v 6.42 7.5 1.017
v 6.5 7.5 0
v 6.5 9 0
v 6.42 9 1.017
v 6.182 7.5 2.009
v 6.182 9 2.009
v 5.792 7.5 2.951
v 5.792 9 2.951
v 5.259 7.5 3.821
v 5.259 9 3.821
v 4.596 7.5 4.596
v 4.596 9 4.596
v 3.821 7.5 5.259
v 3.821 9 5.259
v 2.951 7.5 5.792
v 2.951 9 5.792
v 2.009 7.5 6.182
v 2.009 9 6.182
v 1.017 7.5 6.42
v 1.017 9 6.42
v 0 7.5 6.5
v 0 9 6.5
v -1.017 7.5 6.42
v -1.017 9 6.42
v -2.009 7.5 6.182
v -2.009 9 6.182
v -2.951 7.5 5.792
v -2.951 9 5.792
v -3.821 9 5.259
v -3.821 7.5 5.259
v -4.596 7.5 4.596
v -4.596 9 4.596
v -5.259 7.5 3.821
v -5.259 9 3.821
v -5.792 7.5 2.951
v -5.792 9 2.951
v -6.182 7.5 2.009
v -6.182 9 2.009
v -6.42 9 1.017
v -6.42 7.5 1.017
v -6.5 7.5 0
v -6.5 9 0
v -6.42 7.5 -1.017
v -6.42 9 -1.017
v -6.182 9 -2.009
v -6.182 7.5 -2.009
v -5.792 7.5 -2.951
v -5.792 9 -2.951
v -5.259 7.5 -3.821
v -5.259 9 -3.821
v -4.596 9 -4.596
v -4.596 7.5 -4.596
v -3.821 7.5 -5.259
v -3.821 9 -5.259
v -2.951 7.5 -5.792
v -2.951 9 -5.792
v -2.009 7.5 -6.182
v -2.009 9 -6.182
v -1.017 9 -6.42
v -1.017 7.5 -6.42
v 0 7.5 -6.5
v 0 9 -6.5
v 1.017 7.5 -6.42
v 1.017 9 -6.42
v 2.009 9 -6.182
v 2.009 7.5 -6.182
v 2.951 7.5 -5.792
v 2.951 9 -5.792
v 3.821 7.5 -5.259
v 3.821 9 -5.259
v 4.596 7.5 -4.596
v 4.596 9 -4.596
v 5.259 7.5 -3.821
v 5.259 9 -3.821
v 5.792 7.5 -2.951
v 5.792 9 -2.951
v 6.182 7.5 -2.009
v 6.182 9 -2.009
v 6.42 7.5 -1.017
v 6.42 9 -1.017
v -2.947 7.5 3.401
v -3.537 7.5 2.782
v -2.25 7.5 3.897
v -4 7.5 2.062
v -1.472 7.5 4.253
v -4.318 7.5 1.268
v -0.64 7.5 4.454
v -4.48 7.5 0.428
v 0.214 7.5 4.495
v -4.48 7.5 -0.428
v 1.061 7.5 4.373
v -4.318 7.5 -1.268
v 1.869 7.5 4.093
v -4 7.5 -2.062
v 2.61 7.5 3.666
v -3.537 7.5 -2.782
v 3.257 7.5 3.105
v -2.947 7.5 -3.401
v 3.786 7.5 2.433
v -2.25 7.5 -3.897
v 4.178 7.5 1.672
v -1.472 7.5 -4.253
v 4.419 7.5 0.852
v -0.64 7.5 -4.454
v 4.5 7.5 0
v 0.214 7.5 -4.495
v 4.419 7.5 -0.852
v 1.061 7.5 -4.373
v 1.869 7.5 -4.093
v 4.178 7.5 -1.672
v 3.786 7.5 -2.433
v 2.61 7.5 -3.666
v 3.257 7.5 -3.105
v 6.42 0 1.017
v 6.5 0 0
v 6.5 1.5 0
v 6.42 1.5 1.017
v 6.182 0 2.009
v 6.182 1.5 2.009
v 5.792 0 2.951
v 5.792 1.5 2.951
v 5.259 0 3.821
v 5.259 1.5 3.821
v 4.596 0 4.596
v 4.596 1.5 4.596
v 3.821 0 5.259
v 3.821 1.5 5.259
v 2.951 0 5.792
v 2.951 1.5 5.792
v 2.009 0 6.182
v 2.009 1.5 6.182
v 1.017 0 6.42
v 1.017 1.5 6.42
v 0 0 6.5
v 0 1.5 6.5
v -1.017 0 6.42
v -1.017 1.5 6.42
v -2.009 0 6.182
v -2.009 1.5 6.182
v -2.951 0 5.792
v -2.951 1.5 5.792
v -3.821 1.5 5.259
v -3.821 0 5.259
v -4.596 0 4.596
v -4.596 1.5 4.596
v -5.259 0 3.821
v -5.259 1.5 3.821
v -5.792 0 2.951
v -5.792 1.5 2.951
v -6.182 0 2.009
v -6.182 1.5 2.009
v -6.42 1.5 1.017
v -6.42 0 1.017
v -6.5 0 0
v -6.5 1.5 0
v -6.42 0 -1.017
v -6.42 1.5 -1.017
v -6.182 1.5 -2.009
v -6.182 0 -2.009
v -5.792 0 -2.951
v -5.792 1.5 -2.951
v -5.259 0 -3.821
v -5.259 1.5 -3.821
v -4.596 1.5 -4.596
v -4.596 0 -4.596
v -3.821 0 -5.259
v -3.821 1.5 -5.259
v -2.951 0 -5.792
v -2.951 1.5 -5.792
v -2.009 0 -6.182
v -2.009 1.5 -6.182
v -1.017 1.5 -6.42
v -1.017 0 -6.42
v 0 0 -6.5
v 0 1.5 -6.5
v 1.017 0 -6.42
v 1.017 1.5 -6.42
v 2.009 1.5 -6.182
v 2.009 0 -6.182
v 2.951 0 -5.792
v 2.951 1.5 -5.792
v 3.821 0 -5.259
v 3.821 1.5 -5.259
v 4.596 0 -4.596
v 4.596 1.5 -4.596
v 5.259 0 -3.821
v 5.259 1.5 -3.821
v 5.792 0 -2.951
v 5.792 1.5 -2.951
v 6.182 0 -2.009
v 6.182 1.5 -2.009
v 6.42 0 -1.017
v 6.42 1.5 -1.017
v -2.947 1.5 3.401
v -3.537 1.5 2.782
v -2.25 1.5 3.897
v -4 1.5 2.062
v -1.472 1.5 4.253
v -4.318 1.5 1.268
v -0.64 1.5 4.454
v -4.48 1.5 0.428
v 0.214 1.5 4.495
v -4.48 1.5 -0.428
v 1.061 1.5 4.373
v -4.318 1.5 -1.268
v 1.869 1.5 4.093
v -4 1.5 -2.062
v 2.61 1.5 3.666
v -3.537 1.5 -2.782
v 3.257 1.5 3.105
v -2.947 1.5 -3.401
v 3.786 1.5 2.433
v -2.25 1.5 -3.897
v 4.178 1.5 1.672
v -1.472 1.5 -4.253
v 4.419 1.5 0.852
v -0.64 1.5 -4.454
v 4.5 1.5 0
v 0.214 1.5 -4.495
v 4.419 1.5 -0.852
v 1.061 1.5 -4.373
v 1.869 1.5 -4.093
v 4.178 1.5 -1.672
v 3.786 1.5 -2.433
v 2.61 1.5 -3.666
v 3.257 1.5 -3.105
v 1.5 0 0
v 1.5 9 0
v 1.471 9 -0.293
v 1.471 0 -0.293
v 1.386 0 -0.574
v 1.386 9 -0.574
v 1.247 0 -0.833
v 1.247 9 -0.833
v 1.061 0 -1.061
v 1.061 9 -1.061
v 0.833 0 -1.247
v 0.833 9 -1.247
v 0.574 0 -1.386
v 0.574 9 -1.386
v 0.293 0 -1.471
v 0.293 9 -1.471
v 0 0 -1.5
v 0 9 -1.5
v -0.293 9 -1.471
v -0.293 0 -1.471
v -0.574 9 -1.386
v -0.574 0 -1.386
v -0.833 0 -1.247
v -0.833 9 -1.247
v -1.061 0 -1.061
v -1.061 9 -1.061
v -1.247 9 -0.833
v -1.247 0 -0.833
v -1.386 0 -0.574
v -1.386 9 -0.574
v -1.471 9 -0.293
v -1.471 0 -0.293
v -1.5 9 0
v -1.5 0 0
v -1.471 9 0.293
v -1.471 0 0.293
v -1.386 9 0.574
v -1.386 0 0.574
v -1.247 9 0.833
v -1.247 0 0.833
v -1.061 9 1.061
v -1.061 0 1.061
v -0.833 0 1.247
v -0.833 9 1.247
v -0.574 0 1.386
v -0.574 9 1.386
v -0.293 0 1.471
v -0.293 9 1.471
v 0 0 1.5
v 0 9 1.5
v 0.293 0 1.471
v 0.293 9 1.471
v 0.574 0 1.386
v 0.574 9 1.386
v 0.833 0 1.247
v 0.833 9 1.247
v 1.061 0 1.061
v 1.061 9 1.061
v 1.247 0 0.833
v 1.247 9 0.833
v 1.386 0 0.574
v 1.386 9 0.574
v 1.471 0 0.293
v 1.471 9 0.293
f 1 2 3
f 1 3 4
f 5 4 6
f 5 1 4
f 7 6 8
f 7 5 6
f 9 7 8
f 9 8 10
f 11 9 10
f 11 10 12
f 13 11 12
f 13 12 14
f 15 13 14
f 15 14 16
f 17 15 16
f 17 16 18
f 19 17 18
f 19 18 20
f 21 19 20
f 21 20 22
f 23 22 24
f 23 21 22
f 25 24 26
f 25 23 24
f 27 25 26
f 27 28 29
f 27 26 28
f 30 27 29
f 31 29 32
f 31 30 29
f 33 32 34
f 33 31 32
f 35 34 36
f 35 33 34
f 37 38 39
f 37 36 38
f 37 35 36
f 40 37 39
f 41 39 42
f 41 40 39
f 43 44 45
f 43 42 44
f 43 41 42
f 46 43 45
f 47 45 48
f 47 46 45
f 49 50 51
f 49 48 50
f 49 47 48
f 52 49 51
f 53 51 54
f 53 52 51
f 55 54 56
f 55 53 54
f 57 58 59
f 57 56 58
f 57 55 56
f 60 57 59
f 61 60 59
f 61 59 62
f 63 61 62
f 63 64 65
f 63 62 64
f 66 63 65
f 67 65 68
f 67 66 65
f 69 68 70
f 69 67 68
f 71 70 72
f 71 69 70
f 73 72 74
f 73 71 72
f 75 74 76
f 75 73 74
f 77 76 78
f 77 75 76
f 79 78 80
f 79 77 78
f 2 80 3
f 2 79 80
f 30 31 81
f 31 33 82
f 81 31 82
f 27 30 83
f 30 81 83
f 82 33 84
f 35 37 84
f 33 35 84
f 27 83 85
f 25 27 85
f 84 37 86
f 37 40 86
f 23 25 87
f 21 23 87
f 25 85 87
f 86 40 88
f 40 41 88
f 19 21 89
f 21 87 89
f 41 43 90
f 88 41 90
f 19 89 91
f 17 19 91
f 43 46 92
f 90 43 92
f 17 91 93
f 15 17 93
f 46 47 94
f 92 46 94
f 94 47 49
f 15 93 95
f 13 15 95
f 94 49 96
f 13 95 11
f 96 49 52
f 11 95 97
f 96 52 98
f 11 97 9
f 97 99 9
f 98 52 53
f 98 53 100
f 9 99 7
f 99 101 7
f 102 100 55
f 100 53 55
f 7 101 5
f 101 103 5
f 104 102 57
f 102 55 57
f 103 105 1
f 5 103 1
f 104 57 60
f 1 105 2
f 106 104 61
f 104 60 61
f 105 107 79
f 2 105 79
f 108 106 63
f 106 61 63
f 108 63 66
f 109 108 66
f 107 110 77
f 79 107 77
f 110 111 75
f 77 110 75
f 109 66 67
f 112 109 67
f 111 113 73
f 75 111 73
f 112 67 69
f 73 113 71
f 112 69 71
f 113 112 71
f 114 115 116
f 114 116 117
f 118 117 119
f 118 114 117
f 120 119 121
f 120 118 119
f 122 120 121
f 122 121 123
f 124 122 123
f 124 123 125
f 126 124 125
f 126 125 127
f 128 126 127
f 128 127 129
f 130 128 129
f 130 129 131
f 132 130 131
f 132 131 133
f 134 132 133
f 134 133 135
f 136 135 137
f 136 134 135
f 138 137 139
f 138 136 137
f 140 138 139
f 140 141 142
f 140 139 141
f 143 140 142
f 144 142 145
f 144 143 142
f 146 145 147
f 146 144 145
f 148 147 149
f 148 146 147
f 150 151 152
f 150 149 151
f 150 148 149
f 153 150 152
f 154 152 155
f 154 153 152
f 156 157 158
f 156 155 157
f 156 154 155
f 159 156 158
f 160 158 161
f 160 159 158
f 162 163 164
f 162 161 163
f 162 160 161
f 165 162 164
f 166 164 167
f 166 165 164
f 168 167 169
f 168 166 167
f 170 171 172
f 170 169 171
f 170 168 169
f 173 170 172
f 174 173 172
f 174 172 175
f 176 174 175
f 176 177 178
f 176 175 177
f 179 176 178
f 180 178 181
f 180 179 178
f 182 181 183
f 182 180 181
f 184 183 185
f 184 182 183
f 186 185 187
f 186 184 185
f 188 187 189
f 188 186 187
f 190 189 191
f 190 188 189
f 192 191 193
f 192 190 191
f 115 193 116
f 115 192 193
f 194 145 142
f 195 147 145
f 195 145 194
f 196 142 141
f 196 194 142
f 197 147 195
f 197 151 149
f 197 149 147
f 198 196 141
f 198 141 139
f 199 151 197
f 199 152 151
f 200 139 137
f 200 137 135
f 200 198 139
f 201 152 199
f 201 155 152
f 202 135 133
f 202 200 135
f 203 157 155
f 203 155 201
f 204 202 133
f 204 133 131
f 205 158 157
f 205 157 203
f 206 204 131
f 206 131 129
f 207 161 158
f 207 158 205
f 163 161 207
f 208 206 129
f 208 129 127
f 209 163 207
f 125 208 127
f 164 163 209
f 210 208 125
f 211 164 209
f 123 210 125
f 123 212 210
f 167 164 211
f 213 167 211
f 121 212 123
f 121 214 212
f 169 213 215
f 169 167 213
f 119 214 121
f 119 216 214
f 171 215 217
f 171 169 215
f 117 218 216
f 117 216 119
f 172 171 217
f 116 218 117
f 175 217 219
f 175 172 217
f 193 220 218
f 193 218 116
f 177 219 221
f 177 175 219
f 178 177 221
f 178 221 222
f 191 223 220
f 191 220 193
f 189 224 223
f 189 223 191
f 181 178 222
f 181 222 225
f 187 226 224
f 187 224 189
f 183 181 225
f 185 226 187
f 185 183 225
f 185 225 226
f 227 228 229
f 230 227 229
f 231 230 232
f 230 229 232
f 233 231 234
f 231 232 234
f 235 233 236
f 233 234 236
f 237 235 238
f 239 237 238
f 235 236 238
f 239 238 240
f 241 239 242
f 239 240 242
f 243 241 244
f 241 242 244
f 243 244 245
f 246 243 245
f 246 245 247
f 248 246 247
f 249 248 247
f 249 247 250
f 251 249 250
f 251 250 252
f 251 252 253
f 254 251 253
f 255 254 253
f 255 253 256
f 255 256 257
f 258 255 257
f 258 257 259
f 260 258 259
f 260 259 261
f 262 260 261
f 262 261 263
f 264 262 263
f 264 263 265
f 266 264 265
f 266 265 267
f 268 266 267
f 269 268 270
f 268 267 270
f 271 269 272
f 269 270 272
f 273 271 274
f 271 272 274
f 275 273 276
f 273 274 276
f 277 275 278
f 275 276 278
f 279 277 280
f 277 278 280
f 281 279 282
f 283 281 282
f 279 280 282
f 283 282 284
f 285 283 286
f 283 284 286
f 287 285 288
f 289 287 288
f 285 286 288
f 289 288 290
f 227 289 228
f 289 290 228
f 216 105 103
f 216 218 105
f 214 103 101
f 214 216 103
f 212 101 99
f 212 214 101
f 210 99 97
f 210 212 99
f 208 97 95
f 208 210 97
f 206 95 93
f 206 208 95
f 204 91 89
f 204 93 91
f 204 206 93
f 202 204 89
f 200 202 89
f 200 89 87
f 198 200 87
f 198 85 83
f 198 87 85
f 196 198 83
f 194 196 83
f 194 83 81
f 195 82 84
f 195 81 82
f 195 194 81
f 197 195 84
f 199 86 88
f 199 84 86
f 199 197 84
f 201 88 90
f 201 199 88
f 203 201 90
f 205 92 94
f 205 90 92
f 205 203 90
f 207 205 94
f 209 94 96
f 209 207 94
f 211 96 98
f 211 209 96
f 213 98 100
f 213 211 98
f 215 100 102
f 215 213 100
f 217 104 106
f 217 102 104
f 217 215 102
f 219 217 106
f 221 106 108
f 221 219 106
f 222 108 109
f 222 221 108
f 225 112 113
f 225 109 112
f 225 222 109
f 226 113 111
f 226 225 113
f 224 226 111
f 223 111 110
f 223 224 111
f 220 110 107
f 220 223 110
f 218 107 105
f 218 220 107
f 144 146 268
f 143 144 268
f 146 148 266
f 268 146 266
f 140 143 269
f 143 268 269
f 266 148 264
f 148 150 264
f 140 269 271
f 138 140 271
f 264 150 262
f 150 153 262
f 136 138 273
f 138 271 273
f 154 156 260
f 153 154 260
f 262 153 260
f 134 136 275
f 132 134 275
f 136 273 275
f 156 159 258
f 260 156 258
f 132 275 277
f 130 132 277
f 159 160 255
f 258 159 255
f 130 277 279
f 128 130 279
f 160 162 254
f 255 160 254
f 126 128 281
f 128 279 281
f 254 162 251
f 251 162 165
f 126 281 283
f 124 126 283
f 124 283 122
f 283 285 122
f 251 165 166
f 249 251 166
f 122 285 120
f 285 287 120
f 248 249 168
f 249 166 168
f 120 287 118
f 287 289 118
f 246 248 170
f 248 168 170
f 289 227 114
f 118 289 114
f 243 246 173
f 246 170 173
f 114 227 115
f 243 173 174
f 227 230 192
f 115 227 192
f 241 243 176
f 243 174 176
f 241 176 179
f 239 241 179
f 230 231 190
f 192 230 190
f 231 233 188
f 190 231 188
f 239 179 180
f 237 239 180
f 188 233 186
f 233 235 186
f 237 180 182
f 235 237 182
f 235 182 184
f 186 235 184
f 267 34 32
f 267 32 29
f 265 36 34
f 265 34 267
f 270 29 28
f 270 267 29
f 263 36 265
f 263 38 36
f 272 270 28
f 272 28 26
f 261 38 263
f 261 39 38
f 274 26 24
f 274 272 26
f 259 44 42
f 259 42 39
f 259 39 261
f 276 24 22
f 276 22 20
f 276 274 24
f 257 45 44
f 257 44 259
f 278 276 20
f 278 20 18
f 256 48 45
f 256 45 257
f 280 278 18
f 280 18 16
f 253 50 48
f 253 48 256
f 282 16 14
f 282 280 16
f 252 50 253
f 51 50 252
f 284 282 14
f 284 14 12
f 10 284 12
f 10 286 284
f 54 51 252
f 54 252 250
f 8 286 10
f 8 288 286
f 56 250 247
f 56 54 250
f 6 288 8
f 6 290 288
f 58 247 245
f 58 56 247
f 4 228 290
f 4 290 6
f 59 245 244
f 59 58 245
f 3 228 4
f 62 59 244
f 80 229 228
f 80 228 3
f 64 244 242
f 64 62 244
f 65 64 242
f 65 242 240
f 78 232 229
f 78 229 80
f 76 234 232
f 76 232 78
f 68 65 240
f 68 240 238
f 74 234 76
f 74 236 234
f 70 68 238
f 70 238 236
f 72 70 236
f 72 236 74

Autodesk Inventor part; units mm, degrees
ref_plane "YZ Plane" through (0, 0, 0) normal (1, 0, 0) x (0, 1, 0)
ref_plane "XZ Plane" through (0, 0, 0) normal (0, 1, 0) x (-1, 0, 0)
ref_plane "XY Plane" through (0, 0, 0) normal (0, 0, 1) x (1, 0, 0)
sketch "Sketch1" plane through (0, 0, 0) normal (0, 0, 1) x (1, 0, 0)
  line L0 (1.5, 0) -> (1.5, 9)
  line L1 (1.5, 9) -> (6.5, 9)
  line L2 (6.5, 9) -> (6.5, 7.5)
  line L3 (6.5, 7.5) -> (4.5, 7.5)
  line L4 (4.5, 7.5) -> (4.5, 1.5)
  line L5 (4.5, 1.5) -> (6.5, 1.5)
  line L6 (6.5, 1.5) -> (6.5, 0)
  line L7 (6.5, 0) -> (1.5, 0)
  line L8 (0, -1.8) -> (0, 10.8) projected
  point P0 (0, 0)
  dimension "d0" = 9
  dimension "d1" = 5
  dimension "d2" = 1.5
  dimension "d3" = 2
  dimension "d4" = 1.5
revolve "Revolution1" add sketch "Sketch1" angle 360 about axis through (0, -10, 0) along (0, 1, 0)
properties part number "IdlePulley"
